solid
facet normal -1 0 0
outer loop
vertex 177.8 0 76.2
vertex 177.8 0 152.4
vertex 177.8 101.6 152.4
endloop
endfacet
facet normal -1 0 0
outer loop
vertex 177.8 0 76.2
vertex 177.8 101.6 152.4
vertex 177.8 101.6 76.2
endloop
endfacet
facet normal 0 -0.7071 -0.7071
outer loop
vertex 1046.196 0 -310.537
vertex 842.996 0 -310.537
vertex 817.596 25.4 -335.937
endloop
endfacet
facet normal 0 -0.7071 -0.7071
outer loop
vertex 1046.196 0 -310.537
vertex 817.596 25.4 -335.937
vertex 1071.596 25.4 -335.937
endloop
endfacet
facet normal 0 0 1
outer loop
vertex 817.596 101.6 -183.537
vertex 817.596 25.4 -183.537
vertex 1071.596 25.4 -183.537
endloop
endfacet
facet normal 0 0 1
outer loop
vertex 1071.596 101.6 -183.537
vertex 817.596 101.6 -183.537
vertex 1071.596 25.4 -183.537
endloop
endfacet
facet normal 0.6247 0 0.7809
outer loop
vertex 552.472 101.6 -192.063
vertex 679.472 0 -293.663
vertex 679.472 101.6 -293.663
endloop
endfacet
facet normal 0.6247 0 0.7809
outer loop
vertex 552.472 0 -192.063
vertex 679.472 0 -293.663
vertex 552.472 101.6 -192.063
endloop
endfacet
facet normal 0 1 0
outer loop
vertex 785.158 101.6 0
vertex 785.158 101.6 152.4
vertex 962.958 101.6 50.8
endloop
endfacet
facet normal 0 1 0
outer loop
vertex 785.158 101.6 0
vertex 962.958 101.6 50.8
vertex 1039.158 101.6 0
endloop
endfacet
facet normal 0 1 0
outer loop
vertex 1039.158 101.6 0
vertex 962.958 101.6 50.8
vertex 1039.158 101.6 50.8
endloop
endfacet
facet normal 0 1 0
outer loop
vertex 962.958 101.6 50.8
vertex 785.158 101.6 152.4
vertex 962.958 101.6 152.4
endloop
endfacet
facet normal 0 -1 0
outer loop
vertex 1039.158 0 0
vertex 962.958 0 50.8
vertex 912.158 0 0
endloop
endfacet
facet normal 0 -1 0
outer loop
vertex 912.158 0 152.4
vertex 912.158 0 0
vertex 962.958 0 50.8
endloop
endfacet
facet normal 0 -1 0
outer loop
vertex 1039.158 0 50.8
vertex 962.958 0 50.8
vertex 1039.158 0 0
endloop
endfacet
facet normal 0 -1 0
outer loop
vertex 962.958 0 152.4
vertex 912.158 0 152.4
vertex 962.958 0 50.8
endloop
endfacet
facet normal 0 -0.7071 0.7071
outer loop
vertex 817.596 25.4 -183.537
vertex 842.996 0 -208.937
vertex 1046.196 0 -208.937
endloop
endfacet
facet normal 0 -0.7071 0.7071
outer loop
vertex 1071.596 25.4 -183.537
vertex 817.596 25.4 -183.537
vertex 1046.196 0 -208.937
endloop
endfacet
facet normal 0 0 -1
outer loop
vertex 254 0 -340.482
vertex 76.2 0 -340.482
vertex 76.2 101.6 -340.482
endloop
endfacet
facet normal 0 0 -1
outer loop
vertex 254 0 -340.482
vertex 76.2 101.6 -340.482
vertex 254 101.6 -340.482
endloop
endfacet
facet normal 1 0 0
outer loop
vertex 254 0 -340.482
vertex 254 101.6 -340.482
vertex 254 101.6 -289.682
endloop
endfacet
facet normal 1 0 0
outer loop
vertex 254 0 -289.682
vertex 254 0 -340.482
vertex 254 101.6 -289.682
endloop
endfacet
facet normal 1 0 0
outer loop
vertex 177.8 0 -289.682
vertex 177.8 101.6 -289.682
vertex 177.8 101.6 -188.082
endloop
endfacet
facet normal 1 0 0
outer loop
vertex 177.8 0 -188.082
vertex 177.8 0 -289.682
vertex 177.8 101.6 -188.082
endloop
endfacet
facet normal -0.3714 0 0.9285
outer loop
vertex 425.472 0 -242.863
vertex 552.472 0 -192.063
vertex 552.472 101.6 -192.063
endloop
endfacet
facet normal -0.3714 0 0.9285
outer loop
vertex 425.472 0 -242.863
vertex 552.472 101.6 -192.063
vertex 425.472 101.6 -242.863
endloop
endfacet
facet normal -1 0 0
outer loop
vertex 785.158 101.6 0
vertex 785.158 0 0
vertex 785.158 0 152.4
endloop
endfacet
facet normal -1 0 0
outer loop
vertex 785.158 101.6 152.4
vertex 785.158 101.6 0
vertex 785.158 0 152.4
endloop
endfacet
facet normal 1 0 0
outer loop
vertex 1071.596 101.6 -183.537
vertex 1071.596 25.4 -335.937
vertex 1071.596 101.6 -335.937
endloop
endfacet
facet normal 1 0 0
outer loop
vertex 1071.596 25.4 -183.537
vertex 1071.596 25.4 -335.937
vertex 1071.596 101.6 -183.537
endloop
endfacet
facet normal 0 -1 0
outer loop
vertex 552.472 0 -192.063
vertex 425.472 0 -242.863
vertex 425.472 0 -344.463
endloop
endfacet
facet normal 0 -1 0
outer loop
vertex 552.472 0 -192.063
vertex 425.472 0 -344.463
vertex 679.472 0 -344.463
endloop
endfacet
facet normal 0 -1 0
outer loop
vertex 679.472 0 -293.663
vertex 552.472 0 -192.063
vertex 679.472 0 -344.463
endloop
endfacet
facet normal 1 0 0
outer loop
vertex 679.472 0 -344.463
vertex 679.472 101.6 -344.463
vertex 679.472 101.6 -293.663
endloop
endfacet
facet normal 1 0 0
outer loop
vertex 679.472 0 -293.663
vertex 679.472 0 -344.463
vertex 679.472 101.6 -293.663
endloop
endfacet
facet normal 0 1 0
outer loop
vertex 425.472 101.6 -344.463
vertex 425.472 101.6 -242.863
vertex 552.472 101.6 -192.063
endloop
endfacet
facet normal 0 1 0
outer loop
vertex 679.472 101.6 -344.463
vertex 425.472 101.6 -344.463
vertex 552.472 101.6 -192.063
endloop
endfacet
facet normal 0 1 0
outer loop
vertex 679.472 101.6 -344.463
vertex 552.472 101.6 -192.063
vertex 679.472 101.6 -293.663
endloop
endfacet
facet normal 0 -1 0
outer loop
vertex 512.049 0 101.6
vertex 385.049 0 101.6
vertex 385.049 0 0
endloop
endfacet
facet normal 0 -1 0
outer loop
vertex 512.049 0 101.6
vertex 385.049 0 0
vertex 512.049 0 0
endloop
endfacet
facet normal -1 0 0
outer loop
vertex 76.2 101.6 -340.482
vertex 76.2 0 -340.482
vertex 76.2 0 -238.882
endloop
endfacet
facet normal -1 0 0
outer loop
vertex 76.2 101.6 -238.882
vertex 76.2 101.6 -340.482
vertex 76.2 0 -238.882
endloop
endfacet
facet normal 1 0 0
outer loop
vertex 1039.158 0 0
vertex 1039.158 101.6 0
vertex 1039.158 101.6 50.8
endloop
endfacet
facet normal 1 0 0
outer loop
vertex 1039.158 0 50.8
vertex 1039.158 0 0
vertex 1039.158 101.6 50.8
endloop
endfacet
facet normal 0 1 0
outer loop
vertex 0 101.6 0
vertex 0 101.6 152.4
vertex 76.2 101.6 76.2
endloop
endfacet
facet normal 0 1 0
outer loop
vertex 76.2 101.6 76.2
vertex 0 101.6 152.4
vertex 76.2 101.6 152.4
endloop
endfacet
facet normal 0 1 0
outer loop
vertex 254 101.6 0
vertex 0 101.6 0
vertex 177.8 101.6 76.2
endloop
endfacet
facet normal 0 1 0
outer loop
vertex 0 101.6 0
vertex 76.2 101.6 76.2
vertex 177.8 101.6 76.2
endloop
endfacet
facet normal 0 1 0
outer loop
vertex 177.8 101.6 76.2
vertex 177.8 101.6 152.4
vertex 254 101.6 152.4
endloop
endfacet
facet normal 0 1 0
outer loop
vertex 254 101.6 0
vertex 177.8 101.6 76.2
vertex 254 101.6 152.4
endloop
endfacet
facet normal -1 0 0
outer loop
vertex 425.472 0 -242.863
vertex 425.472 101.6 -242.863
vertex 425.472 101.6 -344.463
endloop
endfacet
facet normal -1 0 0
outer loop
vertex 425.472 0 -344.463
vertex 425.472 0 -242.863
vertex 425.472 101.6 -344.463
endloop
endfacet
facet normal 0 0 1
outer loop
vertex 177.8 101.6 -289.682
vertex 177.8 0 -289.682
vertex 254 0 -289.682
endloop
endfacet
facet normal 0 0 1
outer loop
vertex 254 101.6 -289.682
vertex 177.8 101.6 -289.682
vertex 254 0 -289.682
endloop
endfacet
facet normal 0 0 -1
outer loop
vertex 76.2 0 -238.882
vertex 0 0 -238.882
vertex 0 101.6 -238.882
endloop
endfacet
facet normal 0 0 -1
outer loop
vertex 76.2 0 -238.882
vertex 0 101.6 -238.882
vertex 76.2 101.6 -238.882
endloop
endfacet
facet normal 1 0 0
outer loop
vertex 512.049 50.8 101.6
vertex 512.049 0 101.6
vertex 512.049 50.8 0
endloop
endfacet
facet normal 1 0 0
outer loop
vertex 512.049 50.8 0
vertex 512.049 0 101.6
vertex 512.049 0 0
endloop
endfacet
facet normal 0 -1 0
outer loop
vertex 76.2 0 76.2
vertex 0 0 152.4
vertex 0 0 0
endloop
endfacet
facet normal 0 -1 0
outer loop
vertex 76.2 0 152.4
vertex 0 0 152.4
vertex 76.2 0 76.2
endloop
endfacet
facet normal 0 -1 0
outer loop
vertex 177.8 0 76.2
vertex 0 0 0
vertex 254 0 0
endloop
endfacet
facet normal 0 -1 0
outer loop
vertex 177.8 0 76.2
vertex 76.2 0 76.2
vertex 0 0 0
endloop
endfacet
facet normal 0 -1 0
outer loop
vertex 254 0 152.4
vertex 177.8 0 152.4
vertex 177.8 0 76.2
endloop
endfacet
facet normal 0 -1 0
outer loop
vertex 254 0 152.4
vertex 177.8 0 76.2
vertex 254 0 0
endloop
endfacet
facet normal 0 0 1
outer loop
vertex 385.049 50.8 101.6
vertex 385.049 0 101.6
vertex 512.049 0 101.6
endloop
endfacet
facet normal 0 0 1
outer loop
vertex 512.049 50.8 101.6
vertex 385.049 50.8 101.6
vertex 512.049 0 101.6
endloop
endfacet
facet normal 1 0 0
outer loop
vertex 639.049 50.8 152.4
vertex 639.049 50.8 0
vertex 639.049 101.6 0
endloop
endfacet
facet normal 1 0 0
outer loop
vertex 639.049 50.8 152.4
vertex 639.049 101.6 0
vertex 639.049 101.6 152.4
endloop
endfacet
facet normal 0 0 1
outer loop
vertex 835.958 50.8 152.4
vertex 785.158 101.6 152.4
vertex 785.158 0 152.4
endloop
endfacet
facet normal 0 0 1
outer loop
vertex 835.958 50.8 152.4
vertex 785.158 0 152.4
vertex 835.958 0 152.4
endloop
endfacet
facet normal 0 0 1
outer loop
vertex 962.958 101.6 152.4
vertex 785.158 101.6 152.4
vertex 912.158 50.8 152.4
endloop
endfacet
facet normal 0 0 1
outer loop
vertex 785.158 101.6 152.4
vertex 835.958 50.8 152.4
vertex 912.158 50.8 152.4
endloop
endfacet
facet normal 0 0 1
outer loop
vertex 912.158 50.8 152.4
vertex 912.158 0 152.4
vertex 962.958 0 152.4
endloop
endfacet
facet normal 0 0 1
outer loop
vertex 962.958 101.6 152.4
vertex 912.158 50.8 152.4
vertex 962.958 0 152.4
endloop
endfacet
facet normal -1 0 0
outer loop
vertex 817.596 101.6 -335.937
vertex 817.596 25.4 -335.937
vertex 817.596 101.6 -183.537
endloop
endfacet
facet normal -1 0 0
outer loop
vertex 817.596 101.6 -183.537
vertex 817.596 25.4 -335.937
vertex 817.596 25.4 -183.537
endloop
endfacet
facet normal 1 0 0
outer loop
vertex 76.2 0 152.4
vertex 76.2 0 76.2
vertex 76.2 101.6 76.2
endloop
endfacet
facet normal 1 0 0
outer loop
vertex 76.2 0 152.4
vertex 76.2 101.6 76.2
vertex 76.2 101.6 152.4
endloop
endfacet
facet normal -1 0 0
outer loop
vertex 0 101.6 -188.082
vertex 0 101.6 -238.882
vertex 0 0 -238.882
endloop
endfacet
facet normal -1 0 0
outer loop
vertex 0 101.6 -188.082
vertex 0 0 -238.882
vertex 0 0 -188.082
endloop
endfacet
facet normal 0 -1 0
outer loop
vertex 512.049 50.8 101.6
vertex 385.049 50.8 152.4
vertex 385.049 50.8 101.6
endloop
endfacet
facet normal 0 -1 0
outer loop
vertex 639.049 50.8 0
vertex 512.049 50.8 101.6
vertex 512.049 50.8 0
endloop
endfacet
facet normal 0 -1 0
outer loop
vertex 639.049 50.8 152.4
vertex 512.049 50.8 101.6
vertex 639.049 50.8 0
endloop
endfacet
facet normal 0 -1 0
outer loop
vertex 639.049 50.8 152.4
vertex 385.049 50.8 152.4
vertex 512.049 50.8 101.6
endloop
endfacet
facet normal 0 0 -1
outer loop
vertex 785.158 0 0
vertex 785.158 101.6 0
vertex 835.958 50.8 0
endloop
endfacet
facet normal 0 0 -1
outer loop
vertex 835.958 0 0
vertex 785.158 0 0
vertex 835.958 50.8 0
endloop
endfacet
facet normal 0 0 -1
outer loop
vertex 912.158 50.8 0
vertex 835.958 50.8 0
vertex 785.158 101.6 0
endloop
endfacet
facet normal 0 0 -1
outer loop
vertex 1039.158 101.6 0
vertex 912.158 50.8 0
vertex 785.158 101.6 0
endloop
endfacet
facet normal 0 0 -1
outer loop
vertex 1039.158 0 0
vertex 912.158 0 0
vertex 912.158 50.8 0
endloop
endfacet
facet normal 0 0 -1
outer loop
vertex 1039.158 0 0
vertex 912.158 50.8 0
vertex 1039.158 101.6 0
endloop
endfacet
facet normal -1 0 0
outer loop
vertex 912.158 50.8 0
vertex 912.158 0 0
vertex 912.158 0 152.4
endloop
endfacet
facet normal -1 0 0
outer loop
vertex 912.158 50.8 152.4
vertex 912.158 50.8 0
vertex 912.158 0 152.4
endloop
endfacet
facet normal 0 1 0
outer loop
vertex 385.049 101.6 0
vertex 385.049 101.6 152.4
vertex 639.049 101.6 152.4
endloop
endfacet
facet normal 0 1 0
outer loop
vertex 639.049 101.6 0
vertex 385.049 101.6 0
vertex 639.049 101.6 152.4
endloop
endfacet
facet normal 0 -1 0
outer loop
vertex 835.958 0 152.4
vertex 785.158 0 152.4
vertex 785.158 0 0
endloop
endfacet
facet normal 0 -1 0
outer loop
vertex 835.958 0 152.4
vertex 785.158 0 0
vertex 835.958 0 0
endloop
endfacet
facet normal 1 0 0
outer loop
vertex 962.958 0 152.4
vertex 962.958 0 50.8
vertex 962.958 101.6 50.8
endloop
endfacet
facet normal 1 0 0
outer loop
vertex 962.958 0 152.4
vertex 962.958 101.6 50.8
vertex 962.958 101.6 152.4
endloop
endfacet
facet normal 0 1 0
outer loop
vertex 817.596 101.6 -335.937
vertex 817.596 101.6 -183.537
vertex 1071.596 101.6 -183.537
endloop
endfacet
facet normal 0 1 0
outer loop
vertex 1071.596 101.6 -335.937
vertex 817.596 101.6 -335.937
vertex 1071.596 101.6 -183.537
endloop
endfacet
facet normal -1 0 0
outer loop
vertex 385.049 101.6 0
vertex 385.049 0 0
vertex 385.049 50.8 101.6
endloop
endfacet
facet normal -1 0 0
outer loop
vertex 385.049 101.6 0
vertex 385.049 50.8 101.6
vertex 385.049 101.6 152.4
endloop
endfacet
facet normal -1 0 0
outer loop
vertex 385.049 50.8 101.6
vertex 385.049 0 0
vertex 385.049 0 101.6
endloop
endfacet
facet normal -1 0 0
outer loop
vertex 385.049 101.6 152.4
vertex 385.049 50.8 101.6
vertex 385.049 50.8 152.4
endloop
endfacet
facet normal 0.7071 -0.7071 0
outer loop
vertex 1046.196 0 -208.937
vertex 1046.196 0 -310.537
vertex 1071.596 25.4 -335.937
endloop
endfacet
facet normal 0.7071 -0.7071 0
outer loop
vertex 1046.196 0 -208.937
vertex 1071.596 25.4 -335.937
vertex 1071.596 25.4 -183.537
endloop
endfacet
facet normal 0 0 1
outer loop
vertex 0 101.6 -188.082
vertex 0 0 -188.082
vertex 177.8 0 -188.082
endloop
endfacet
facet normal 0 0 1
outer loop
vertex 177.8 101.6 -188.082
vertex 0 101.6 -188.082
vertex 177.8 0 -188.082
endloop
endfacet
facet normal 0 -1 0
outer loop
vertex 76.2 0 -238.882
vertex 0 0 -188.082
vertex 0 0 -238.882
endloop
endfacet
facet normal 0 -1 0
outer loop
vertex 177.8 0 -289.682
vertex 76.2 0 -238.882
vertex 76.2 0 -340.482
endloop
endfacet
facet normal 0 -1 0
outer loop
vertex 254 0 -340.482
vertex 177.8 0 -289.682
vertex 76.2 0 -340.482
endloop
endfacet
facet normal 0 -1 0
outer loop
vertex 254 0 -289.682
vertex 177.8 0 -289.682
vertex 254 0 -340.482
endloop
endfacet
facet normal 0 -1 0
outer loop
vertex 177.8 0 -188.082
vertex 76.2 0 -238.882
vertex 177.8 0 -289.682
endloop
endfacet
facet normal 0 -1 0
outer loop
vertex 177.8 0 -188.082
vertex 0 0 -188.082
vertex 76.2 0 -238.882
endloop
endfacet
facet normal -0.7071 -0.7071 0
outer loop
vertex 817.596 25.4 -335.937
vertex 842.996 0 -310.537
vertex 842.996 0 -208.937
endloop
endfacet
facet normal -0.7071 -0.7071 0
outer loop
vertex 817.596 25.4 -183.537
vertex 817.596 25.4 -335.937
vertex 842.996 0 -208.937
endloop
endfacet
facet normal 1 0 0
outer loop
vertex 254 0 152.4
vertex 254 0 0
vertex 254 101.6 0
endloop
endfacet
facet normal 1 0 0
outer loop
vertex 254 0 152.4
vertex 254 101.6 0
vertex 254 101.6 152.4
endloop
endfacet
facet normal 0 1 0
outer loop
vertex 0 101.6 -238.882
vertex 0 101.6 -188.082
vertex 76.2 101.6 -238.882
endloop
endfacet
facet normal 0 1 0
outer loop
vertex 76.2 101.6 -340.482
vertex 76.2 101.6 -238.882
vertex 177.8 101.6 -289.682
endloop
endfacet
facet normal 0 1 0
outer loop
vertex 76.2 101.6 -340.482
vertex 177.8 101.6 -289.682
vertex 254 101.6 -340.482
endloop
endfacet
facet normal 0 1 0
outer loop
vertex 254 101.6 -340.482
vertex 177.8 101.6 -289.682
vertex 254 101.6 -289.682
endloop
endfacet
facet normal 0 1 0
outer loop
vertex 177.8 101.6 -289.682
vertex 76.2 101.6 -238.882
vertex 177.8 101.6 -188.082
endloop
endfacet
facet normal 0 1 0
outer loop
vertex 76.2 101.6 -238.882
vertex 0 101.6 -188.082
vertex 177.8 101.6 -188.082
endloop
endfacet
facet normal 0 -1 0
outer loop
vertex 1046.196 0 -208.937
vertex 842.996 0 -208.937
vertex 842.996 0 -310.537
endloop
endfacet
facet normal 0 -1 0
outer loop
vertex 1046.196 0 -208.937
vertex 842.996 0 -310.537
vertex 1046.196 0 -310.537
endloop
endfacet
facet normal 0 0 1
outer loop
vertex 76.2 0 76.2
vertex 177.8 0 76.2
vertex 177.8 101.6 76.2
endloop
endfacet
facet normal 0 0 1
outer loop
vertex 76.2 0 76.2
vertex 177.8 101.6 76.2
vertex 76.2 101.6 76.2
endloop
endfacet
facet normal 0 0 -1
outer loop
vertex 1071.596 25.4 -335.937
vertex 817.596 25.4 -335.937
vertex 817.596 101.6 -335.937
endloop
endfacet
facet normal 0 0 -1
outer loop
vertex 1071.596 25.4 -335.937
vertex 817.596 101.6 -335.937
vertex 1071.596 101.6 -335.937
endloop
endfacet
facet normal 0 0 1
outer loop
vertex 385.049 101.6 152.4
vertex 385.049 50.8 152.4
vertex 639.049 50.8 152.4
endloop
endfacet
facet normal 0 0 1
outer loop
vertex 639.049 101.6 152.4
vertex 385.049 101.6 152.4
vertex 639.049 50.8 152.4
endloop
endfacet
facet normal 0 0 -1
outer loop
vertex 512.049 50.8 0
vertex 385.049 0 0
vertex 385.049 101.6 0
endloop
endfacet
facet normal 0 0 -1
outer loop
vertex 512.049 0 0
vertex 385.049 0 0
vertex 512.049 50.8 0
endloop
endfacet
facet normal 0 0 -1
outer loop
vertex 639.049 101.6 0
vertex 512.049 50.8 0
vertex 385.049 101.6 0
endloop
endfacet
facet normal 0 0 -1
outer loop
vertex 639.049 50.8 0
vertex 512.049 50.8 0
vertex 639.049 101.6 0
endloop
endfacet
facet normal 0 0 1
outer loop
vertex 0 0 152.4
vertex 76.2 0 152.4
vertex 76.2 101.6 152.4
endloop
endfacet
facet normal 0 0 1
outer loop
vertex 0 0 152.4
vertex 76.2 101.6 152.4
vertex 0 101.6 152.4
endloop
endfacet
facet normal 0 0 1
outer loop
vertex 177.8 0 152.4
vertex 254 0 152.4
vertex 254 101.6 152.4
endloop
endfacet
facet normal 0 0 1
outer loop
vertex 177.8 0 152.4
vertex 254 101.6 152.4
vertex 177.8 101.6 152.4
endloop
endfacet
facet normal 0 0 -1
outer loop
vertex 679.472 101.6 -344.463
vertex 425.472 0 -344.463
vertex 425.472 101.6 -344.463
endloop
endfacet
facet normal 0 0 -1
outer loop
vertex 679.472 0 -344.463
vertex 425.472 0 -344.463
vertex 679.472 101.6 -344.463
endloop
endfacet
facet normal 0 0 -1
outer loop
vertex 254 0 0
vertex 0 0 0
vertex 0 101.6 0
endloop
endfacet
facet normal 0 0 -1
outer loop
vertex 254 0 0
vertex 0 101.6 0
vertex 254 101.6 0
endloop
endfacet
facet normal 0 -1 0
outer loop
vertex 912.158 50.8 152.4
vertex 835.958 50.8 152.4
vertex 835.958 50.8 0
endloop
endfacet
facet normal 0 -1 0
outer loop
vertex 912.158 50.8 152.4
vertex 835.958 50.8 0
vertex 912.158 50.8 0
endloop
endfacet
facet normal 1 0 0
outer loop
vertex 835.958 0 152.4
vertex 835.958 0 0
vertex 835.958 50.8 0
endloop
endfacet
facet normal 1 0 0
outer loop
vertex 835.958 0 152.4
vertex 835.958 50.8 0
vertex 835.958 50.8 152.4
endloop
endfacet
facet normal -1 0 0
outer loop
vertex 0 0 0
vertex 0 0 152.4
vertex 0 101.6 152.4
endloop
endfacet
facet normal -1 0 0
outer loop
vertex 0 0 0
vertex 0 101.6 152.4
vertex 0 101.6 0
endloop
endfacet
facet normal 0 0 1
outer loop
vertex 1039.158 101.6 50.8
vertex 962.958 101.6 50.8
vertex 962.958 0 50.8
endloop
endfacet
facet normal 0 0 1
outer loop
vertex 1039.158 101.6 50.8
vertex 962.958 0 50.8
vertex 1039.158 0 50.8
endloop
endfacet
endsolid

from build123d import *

# Parameters (mm, degrees)
F1_DEPTH  = 101.6
F2_W      = 254
F2_H      = 152.4
F3_DEPTH  = 101.6
F5_DEPTH  = 50.8
F6_W      = 254
F6_H      = 152.4
F7_DEPTH  = 101.6
F8_W      = 76.2
F8_H      = 152.4
F9_DEPTH  = 50.8
F10_W     = 76.2
F10_H     = 101.6
F11_DEPTH = 167.64
F12_W     = 254
F12_H     = 152.4
F13_DEPTH = 101.6
F14_W     = 76.2
F14_H     = 101.6
F15_DEPTH = 223.52
F16_W     = 76.2
F16_H     = 101.6
F17_DEPTH = 132.08
F19_DEPTH = 101.6
F20_W     = 254
F20_H     = 152.4
F21_DEPTH = 101.6
F22_SIZE  = 25.4


with BuildPart() as f1:
    # F0 (on Front) → F1 (new body)
    with BuildSketch(Plane.XZ):
        Polygon((0, 152.4), (0, 0), (254, 0), (254, 152.4), (177.8, 152.4), (177.8, 76.2), (76.2, 76.2), (76.2, 152.4), align=None)
    extrude(amount=-F1_DEPTH)


with BuildPart() as f3:
    # F2 (on Front) → F3 (new body)
    with BuildSketch(Plane.XZ):
        with Locations((512.048569, 76.2)):
            Rectangle(F2_W, F2_H)
    extrude(amount=-F3_DEPTH)

    # F4 (on face) → F5 (cut)
    with BuildSketch(Plane.XZ):
        Polygon((512.048569, 101.6), (512.048569, 0), (639.048569, 0), (639.048569, 152.4), (385.048569, 152.4), (385.048569, 101.6), align=None)
    extrude(amount=-F5_DEPTH, mode=Mode.SUBTRACT)


with BuildPart() as f7:
    # F6 (on Front) → F7 (new body)
    with BuildSketch(Plane.XZ):
        with Locations((912.157599, 76.2)):
            Rectangle(F6_W, F6_H)
    extrude(amount=-F7_DEPTH)

    # F8 (on face) → F9 (cut)
    with BuildSketch(Plane.XZ):
        with Locations((874.057599, 76.2)):
            Rectangle(F8_W, F8_H)
    extrude(amount=-F9_DEPTH, mode=Mode.SUBTRACT)

    # F10 (on face) → F11 (cut)
    with BuildSketch(Plane.XZ):
        with Locations((1001.057599, 101.6)):
            Rectangle(F10_W, F10_H)
    extrude(amount=-F11_DEPTH, mode=Mode.SUBTRACT)


with BuildPart() as f13:
    # F12 (on Front) → F13 (new body)
    with BuildSketch(Plane.XZ):
        with Locations((127, -264.282233)):
            Rectangle(F12_W, F12_H)
    extrude(amount=-F13_DEPTH)

    # F14 (on face) → F15 (cut)
    with BuildSketch(Plane.XZ):
        with Locations((38.1, -289.682233)):
            Rectangle(F14_W, F14_H)
    extrude(amount=-F15_DEPTH, mode=Mode.SUBTRACT)

    # F16 (on face) → F17 (cut)
    with BuildSketch(Plane.XZ):
        with Locations((215.9, -238.882233)):
            Rectangle(F16_W, F16_H)
    extrude(amount=-F17_DEPTH, mode=Mode.SUBTRACT)


with BuildPart() as f19:
    # F18 (on Front) → F19 (new body)
    with BuildSketch(Plane.XZ):
        Polygon((425.471574, -242.862809), (425.471574, -344.462809), (679.471574, -344.462809), (679.471574, -293.662809), (552.471574, -192.062809), align=None)
    extrude(amount=-F19_DEPTH)


with BuildPart() as f21:
    # F20 (on Front) → F21 (new body)
    with BuildSketch(Plane.XZ):
        with Locations((944.596228, -259.737119)):
            Rectangle(F20_W, F20_H)
    extrude(amount=-F21_DEPTH)

    # F22
    f22_edges = [f21.edges().sort_by_distance(p)[0] for p in [
        (817.596228, 0, -259.737119),
        (944.596228, 0, -335.937119),
        (1071.596228, 0, -259.737119),
        (944.596228, 0, -183.537119),
    ]]
    chamfer(f22_edges, length=F22_SIZE)


solid = Compound([f1.part, f3.part, f7.part, f13.part, f19.part, f21.part])
